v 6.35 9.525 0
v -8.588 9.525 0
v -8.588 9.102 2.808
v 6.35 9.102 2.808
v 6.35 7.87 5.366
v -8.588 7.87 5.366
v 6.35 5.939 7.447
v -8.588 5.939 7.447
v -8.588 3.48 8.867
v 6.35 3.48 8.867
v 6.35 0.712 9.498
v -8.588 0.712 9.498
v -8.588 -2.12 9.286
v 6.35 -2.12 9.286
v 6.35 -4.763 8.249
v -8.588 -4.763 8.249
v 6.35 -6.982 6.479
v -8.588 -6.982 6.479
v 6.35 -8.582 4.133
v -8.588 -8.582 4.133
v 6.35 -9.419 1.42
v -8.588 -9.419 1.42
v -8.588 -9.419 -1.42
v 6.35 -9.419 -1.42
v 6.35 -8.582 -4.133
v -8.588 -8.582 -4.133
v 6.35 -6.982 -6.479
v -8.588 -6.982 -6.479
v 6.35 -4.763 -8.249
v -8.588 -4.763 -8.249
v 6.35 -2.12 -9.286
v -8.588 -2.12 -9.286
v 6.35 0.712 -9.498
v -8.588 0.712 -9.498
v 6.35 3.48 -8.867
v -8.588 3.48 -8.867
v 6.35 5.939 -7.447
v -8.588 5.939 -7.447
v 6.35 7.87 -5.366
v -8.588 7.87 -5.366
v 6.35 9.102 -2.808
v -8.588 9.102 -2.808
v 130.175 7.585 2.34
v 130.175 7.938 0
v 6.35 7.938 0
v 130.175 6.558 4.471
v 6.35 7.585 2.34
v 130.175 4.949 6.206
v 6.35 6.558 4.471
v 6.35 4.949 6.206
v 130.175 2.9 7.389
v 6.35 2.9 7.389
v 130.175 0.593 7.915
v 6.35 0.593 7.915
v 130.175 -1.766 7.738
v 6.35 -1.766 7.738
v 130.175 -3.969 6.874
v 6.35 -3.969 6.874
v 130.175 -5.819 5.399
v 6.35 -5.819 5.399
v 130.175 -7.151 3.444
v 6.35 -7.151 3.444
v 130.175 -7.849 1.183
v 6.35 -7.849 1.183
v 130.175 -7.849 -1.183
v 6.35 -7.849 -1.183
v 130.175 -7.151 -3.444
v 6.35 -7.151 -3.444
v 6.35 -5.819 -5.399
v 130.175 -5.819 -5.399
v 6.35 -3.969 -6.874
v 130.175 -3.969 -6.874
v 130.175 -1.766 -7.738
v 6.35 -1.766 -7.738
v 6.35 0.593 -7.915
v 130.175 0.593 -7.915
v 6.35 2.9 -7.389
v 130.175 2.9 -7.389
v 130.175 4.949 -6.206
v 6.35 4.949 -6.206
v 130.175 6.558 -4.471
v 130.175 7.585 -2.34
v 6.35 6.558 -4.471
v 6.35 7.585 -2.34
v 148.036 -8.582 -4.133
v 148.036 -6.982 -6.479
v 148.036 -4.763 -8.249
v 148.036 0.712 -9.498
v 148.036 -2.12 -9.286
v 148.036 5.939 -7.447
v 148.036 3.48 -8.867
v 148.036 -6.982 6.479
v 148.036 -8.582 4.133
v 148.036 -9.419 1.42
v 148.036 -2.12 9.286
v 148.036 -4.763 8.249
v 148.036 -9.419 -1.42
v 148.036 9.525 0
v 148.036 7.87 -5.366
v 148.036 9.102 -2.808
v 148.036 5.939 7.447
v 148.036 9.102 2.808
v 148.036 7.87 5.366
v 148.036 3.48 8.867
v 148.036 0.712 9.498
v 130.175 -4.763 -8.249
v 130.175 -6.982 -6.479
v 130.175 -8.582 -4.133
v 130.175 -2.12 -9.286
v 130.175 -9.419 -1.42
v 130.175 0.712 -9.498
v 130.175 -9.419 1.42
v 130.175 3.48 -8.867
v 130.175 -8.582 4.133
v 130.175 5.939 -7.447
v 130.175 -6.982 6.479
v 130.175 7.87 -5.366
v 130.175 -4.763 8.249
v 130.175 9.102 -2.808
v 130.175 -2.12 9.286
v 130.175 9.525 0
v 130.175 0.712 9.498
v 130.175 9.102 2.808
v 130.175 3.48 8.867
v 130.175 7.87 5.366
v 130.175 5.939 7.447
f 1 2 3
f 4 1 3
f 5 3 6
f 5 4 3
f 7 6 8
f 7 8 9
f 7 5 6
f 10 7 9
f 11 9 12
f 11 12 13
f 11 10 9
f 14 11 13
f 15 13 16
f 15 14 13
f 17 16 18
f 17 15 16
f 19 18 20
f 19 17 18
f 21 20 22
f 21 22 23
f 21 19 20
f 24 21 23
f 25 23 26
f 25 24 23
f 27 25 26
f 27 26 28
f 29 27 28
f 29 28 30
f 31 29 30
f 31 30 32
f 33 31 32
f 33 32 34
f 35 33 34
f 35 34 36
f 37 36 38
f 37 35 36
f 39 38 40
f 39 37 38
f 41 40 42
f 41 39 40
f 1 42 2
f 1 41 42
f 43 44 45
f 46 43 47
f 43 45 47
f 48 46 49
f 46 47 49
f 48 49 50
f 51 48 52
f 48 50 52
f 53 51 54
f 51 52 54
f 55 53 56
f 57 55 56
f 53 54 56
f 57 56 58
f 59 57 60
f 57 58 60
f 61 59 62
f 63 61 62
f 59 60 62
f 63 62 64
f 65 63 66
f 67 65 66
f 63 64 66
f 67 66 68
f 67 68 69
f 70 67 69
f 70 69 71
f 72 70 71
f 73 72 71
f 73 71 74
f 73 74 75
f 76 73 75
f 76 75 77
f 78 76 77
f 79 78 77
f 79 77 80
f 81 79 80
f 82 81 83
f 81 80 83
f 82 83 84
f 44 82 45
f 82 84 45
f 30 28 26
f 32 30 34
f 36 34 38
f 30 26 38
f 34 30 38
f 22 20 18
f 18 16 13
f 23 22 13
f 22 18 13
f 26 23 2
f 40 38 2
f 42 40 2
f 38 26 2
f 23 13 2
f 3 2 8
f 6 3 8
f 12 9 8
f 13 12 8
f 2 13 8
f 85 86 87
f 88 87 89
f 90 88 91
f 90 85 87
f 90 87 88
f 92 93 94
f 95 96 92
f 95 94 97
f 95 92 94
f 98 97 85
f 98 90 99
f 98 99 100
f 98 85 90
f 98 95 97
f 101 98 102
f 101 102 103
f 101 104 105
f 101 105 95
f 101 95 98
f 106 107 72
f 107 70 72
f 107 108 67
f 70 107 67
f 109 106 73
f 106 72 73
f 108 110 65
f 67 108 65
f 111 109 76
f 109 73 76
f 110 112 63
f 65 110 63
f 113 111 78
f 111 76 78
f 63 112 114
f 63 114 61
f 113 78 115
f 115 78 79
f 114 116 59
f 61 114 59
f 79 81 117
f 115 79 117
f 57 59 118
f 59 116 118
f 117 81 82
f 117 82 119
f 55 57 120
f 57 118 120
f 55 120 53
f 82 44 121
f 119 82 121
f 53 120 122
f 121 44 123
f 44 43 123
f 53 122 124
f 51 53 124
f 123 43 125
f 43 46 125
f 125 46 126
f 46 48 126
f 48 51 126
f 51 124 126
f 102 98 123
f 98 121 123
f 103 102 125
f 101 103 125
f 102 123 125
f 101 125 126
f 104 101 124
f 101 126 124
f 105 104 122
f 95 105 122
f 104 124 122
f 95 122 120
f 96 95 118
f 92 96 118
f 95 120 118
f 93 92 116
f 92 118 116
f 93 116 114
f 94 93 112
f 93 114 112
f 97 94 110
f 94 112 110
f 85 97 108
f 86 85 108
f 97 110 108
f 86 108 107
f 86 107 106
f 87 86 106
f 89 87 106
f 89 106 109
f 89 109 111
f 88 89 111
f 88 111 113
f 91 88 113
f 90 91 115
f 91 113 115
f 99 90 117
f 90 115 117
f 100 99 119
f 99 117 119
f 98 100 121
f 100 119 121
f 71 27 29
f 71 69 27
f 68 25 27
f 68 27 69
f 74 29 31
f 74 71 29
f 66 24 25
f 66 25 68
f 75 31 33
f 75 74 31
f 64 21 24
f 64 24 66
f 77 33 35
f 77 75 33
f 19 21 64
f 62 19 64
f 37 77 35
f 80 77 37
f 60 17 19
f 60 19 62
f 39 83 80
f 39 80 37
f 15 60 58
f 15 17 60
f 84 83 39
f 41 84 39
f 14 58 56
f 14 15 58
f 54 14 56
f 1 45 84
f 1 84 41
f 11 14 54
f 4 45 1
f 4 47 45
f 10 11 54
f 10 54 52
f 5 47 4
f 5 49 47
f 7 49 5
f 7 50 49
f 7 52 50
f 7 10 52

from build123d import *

# Parameters (mm, degrees)
F0_R          = 9.525
F1_DEPTH      = 6.35
F1_DEPTH_BACK = 8.58774
F2_R          = 7.9375
F3_DEPTH      = 123.825
F4_R          = 9.525
F5_DEPTH      = 15.24
F6_DEPTH      = 2.62128


with BuildPart() as f1:
    # F0 (on Right) → F1 (new body, two sides)
    with BuildSketch(Plane.YZ) as f1_sk:
        Circle(F0_R)
    extrude(amount=F1_DEPTH)
    extrude(f1_sk.sketch, amount=-F1_DEPTH_BACK)

    # F2 (on face) → F3 (join)
    with BuildSketch(Plane.YZ.offset(6.35)):
        Circle(F2_R)
    extrude(amount=F3_DEPTH)

    # F4 (on face) → F5 (join)
    with BuildSketch(Plane.YZ.offset(130.175)):
        Circle(F4_R)
    extrude(amount=F5_DEPTH)

    # F6 (add): a face of the model
    f6_faces = [f1.faces().sort_by_distance(p)[0] for p in [
        (145.415, 0, 0),
    ]]
    extrude(f6_faces, amount=F6_DEPTH)


solid = f1.part
